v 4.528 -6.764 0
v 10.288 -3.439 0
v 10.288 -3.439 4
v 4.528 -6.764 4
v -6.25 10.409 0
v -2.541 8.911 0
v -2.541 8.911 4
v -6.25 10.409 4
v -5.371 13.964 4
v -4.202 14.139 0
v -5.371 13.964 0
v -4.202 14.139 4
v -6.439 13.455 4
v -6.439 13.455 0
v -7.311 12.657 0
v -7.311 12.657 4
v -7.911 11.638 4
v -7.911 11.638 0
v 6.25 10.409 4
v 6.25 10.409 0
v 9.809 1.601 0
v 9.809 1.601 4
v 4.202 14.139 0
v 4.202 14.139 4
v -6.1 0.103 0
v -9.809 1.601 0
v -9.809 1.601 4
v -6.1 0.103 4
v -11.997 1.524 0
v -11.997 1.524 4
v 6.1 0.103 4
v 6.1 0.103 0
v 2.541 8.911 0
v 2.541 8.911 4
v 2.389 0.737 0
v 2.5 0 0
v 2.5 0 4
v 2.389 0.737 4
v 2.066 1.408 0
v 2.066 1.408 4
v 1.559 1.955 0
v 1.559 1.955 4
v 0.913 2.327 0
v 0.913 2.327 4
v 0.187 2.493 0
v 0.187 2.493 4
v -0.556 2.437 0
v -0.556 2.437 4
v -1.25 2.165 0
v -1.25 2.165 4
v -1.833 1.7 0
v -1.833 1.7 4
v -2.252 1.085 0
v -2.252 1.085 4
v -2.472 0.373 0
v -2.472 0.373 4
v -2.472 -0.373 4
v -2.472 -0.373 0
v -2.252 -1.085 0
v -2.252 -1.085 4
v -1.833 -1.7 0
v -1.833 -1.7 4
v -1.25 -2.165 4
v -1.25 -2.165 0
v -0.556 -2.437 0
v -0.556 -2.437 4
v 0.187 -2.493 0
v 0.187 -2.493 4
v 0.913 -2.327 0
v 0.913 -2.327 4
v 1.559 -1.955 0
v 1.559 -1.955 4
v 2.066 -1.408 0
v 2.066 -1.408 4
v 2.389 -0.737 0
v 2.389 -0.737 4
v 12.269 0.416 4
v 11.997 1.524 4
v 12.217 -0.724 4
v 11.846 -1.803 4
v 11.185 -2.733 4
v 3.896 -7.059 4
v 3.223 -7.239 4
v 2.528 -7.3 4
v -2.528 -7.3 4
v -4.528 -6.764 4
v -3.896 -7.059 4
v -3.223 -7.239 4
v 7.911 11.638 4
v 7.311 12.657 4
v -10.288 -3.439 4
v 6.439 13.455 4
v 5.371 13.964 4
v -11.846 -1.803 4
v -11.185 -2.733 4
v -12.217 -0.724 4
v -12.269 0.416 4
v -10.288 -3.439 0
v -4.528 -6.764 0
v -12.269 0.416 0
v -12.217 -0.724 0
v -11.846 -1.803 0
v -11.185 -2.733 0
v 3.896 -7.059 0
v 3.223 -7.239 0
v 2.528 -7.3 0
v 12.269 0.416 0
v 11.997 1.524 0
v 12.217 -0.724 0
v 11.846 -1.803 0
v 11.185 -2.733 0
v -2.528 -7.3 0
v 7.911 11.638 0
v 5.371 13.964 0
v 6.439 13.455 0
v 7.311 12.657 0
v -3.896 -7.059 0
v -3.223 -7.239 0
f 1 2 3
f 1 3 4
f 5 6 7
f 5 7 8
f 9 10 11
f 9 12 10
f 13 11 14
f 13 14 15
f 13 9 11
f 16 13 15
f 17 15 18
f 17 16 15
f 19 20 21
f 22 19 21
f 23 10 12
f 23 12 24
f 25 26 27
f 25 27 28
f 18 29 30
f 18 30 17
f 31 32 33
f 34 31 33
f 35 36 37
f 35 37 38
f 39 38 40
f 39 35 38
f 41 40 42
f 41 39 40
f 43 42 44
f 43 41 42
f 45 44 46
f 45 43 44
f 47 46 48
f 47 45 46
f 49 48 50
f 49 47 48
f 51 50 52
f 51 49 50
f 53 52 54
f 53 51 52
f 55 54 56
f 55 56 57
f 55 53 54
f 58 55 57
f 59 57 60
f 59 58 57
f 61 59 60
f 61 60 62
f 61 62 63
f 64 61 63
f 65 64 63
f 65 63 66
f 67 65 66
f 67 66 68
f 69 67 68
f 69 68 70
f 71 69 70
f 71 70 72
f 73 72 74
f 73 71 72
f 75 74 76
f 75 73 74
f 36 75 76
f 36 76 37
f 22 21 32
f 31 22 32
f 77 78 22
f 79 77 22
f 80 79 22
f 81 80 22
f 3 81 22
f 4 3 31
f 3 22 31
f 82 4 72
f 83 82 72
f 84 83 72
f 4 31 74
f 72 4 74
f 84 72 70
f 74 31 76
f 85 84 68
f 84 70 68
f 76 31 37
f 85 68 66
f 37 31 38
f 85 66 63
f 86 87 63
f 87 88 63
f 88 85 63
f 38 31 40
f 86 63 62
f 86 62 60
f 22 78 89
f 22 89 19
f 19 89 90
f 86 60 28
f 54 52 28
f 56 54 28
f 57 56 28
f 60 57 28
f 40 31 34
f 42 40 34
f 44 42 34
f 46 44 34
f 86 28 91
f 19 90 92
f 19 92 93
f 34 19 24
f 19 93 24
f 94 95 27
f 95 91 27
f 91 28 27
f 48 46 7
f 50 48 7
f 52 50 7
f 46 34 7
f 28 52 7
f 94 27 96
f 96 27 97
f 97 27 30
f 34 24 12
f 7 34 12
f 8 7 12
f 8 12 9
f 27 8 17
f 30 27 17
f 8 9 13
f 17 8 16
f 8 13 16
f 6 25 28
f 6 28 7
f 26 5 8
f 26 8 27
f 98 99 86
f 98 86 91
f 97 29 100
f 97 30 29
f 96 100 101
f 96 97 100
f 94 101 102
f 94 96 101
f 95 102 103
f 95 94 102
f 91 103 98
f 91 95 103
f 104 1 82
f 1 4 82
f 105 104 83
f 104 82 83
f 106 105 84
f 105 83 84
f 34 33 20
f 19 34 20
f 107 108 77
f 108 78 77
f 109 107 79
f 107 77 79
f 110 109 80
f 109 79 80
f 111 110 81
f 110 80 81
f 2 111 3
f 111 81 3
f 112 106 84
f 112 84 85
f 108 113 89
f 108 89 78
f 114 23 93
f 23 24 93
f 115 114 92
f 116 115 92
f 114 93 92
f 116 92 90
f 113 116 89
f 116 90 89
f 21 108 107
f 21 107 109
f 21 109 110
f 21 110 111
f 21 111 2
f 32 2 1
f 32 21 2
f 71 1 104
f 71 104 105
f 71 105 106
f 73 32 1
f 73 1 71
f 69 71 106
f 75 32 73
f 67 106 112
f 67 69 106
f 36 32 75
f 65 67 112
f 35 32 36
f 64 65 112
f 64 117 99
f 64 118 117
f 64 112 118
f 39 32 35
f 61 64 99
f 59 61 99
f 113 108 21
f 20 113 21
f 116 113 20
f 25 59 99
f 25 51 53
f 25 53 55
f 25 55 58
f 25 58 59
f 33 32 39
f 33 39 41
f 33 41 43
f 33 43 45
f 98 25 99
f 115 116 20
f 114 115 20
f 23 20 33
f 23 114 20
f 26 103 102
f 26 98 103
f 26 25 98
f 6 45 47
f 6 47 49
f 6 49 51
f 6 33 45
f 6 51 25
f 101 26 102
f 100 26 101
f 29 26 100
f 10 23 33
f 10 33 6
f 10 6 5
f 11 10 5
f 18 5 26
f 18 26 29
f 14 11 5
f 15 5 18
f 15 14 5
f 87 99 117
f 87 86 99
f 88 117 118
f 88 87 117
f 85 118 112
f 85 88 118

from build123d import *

# Parameters (mm, degrees)
SKETCH_1_R      = 2.5
EXTRUDE_1_DEPTH = 4
FILLET_1_R      = 4


with BuildPart() as part:
    # ｽｹｯﾁ1 → ﾎﾞｽ - 押し出し1 (new body)
    with BuildSketch(Plane.XY):
        Polygon((-6.9, 14.13928001), (6.9, 14.13928001), (13.299484522, -1.7), (3.6, -7.3), (-3.6, -7.3), (-13.299484522, -1.7), align=None)
        Circle(SKETCH_1_R, mode=Mode.SUBTRACT)
        Polygon((2.541237363, 8.910793136), (6.249972781, 10.409219509), (9.808735418, 1.600972891), (6.1, 0.102546517), align=None, mode=Mode.SUBTRACT)
        Polygon((-6.1, 0.102546517), (-2.541237363, 8.910793136), (-6.249972781, 10.409219509), (-9.808735418, 1.600972891), align=None, mode=Mode.SUBTRACT)
    extrude(amount=EXTRUDE_1_DEPTH)

    # ﾌｨﾚｯﾄ1
    fillet_1_edges = [part.edges().sort_by_distance(p)[0] for p in [
        (13.299484522, -1.7, 2),
        (3.6, -7.3, 2),
        (-3.6, -7.3, 2),
        (-13.299484522, -1.7, 2),
        (-6.9, 14.13928001, 2),
        (6.9, 14.13928001, 2),
    ]]
    fillet(fillet_1_edges, radius=FILLET_1_R)


solid = part.part
